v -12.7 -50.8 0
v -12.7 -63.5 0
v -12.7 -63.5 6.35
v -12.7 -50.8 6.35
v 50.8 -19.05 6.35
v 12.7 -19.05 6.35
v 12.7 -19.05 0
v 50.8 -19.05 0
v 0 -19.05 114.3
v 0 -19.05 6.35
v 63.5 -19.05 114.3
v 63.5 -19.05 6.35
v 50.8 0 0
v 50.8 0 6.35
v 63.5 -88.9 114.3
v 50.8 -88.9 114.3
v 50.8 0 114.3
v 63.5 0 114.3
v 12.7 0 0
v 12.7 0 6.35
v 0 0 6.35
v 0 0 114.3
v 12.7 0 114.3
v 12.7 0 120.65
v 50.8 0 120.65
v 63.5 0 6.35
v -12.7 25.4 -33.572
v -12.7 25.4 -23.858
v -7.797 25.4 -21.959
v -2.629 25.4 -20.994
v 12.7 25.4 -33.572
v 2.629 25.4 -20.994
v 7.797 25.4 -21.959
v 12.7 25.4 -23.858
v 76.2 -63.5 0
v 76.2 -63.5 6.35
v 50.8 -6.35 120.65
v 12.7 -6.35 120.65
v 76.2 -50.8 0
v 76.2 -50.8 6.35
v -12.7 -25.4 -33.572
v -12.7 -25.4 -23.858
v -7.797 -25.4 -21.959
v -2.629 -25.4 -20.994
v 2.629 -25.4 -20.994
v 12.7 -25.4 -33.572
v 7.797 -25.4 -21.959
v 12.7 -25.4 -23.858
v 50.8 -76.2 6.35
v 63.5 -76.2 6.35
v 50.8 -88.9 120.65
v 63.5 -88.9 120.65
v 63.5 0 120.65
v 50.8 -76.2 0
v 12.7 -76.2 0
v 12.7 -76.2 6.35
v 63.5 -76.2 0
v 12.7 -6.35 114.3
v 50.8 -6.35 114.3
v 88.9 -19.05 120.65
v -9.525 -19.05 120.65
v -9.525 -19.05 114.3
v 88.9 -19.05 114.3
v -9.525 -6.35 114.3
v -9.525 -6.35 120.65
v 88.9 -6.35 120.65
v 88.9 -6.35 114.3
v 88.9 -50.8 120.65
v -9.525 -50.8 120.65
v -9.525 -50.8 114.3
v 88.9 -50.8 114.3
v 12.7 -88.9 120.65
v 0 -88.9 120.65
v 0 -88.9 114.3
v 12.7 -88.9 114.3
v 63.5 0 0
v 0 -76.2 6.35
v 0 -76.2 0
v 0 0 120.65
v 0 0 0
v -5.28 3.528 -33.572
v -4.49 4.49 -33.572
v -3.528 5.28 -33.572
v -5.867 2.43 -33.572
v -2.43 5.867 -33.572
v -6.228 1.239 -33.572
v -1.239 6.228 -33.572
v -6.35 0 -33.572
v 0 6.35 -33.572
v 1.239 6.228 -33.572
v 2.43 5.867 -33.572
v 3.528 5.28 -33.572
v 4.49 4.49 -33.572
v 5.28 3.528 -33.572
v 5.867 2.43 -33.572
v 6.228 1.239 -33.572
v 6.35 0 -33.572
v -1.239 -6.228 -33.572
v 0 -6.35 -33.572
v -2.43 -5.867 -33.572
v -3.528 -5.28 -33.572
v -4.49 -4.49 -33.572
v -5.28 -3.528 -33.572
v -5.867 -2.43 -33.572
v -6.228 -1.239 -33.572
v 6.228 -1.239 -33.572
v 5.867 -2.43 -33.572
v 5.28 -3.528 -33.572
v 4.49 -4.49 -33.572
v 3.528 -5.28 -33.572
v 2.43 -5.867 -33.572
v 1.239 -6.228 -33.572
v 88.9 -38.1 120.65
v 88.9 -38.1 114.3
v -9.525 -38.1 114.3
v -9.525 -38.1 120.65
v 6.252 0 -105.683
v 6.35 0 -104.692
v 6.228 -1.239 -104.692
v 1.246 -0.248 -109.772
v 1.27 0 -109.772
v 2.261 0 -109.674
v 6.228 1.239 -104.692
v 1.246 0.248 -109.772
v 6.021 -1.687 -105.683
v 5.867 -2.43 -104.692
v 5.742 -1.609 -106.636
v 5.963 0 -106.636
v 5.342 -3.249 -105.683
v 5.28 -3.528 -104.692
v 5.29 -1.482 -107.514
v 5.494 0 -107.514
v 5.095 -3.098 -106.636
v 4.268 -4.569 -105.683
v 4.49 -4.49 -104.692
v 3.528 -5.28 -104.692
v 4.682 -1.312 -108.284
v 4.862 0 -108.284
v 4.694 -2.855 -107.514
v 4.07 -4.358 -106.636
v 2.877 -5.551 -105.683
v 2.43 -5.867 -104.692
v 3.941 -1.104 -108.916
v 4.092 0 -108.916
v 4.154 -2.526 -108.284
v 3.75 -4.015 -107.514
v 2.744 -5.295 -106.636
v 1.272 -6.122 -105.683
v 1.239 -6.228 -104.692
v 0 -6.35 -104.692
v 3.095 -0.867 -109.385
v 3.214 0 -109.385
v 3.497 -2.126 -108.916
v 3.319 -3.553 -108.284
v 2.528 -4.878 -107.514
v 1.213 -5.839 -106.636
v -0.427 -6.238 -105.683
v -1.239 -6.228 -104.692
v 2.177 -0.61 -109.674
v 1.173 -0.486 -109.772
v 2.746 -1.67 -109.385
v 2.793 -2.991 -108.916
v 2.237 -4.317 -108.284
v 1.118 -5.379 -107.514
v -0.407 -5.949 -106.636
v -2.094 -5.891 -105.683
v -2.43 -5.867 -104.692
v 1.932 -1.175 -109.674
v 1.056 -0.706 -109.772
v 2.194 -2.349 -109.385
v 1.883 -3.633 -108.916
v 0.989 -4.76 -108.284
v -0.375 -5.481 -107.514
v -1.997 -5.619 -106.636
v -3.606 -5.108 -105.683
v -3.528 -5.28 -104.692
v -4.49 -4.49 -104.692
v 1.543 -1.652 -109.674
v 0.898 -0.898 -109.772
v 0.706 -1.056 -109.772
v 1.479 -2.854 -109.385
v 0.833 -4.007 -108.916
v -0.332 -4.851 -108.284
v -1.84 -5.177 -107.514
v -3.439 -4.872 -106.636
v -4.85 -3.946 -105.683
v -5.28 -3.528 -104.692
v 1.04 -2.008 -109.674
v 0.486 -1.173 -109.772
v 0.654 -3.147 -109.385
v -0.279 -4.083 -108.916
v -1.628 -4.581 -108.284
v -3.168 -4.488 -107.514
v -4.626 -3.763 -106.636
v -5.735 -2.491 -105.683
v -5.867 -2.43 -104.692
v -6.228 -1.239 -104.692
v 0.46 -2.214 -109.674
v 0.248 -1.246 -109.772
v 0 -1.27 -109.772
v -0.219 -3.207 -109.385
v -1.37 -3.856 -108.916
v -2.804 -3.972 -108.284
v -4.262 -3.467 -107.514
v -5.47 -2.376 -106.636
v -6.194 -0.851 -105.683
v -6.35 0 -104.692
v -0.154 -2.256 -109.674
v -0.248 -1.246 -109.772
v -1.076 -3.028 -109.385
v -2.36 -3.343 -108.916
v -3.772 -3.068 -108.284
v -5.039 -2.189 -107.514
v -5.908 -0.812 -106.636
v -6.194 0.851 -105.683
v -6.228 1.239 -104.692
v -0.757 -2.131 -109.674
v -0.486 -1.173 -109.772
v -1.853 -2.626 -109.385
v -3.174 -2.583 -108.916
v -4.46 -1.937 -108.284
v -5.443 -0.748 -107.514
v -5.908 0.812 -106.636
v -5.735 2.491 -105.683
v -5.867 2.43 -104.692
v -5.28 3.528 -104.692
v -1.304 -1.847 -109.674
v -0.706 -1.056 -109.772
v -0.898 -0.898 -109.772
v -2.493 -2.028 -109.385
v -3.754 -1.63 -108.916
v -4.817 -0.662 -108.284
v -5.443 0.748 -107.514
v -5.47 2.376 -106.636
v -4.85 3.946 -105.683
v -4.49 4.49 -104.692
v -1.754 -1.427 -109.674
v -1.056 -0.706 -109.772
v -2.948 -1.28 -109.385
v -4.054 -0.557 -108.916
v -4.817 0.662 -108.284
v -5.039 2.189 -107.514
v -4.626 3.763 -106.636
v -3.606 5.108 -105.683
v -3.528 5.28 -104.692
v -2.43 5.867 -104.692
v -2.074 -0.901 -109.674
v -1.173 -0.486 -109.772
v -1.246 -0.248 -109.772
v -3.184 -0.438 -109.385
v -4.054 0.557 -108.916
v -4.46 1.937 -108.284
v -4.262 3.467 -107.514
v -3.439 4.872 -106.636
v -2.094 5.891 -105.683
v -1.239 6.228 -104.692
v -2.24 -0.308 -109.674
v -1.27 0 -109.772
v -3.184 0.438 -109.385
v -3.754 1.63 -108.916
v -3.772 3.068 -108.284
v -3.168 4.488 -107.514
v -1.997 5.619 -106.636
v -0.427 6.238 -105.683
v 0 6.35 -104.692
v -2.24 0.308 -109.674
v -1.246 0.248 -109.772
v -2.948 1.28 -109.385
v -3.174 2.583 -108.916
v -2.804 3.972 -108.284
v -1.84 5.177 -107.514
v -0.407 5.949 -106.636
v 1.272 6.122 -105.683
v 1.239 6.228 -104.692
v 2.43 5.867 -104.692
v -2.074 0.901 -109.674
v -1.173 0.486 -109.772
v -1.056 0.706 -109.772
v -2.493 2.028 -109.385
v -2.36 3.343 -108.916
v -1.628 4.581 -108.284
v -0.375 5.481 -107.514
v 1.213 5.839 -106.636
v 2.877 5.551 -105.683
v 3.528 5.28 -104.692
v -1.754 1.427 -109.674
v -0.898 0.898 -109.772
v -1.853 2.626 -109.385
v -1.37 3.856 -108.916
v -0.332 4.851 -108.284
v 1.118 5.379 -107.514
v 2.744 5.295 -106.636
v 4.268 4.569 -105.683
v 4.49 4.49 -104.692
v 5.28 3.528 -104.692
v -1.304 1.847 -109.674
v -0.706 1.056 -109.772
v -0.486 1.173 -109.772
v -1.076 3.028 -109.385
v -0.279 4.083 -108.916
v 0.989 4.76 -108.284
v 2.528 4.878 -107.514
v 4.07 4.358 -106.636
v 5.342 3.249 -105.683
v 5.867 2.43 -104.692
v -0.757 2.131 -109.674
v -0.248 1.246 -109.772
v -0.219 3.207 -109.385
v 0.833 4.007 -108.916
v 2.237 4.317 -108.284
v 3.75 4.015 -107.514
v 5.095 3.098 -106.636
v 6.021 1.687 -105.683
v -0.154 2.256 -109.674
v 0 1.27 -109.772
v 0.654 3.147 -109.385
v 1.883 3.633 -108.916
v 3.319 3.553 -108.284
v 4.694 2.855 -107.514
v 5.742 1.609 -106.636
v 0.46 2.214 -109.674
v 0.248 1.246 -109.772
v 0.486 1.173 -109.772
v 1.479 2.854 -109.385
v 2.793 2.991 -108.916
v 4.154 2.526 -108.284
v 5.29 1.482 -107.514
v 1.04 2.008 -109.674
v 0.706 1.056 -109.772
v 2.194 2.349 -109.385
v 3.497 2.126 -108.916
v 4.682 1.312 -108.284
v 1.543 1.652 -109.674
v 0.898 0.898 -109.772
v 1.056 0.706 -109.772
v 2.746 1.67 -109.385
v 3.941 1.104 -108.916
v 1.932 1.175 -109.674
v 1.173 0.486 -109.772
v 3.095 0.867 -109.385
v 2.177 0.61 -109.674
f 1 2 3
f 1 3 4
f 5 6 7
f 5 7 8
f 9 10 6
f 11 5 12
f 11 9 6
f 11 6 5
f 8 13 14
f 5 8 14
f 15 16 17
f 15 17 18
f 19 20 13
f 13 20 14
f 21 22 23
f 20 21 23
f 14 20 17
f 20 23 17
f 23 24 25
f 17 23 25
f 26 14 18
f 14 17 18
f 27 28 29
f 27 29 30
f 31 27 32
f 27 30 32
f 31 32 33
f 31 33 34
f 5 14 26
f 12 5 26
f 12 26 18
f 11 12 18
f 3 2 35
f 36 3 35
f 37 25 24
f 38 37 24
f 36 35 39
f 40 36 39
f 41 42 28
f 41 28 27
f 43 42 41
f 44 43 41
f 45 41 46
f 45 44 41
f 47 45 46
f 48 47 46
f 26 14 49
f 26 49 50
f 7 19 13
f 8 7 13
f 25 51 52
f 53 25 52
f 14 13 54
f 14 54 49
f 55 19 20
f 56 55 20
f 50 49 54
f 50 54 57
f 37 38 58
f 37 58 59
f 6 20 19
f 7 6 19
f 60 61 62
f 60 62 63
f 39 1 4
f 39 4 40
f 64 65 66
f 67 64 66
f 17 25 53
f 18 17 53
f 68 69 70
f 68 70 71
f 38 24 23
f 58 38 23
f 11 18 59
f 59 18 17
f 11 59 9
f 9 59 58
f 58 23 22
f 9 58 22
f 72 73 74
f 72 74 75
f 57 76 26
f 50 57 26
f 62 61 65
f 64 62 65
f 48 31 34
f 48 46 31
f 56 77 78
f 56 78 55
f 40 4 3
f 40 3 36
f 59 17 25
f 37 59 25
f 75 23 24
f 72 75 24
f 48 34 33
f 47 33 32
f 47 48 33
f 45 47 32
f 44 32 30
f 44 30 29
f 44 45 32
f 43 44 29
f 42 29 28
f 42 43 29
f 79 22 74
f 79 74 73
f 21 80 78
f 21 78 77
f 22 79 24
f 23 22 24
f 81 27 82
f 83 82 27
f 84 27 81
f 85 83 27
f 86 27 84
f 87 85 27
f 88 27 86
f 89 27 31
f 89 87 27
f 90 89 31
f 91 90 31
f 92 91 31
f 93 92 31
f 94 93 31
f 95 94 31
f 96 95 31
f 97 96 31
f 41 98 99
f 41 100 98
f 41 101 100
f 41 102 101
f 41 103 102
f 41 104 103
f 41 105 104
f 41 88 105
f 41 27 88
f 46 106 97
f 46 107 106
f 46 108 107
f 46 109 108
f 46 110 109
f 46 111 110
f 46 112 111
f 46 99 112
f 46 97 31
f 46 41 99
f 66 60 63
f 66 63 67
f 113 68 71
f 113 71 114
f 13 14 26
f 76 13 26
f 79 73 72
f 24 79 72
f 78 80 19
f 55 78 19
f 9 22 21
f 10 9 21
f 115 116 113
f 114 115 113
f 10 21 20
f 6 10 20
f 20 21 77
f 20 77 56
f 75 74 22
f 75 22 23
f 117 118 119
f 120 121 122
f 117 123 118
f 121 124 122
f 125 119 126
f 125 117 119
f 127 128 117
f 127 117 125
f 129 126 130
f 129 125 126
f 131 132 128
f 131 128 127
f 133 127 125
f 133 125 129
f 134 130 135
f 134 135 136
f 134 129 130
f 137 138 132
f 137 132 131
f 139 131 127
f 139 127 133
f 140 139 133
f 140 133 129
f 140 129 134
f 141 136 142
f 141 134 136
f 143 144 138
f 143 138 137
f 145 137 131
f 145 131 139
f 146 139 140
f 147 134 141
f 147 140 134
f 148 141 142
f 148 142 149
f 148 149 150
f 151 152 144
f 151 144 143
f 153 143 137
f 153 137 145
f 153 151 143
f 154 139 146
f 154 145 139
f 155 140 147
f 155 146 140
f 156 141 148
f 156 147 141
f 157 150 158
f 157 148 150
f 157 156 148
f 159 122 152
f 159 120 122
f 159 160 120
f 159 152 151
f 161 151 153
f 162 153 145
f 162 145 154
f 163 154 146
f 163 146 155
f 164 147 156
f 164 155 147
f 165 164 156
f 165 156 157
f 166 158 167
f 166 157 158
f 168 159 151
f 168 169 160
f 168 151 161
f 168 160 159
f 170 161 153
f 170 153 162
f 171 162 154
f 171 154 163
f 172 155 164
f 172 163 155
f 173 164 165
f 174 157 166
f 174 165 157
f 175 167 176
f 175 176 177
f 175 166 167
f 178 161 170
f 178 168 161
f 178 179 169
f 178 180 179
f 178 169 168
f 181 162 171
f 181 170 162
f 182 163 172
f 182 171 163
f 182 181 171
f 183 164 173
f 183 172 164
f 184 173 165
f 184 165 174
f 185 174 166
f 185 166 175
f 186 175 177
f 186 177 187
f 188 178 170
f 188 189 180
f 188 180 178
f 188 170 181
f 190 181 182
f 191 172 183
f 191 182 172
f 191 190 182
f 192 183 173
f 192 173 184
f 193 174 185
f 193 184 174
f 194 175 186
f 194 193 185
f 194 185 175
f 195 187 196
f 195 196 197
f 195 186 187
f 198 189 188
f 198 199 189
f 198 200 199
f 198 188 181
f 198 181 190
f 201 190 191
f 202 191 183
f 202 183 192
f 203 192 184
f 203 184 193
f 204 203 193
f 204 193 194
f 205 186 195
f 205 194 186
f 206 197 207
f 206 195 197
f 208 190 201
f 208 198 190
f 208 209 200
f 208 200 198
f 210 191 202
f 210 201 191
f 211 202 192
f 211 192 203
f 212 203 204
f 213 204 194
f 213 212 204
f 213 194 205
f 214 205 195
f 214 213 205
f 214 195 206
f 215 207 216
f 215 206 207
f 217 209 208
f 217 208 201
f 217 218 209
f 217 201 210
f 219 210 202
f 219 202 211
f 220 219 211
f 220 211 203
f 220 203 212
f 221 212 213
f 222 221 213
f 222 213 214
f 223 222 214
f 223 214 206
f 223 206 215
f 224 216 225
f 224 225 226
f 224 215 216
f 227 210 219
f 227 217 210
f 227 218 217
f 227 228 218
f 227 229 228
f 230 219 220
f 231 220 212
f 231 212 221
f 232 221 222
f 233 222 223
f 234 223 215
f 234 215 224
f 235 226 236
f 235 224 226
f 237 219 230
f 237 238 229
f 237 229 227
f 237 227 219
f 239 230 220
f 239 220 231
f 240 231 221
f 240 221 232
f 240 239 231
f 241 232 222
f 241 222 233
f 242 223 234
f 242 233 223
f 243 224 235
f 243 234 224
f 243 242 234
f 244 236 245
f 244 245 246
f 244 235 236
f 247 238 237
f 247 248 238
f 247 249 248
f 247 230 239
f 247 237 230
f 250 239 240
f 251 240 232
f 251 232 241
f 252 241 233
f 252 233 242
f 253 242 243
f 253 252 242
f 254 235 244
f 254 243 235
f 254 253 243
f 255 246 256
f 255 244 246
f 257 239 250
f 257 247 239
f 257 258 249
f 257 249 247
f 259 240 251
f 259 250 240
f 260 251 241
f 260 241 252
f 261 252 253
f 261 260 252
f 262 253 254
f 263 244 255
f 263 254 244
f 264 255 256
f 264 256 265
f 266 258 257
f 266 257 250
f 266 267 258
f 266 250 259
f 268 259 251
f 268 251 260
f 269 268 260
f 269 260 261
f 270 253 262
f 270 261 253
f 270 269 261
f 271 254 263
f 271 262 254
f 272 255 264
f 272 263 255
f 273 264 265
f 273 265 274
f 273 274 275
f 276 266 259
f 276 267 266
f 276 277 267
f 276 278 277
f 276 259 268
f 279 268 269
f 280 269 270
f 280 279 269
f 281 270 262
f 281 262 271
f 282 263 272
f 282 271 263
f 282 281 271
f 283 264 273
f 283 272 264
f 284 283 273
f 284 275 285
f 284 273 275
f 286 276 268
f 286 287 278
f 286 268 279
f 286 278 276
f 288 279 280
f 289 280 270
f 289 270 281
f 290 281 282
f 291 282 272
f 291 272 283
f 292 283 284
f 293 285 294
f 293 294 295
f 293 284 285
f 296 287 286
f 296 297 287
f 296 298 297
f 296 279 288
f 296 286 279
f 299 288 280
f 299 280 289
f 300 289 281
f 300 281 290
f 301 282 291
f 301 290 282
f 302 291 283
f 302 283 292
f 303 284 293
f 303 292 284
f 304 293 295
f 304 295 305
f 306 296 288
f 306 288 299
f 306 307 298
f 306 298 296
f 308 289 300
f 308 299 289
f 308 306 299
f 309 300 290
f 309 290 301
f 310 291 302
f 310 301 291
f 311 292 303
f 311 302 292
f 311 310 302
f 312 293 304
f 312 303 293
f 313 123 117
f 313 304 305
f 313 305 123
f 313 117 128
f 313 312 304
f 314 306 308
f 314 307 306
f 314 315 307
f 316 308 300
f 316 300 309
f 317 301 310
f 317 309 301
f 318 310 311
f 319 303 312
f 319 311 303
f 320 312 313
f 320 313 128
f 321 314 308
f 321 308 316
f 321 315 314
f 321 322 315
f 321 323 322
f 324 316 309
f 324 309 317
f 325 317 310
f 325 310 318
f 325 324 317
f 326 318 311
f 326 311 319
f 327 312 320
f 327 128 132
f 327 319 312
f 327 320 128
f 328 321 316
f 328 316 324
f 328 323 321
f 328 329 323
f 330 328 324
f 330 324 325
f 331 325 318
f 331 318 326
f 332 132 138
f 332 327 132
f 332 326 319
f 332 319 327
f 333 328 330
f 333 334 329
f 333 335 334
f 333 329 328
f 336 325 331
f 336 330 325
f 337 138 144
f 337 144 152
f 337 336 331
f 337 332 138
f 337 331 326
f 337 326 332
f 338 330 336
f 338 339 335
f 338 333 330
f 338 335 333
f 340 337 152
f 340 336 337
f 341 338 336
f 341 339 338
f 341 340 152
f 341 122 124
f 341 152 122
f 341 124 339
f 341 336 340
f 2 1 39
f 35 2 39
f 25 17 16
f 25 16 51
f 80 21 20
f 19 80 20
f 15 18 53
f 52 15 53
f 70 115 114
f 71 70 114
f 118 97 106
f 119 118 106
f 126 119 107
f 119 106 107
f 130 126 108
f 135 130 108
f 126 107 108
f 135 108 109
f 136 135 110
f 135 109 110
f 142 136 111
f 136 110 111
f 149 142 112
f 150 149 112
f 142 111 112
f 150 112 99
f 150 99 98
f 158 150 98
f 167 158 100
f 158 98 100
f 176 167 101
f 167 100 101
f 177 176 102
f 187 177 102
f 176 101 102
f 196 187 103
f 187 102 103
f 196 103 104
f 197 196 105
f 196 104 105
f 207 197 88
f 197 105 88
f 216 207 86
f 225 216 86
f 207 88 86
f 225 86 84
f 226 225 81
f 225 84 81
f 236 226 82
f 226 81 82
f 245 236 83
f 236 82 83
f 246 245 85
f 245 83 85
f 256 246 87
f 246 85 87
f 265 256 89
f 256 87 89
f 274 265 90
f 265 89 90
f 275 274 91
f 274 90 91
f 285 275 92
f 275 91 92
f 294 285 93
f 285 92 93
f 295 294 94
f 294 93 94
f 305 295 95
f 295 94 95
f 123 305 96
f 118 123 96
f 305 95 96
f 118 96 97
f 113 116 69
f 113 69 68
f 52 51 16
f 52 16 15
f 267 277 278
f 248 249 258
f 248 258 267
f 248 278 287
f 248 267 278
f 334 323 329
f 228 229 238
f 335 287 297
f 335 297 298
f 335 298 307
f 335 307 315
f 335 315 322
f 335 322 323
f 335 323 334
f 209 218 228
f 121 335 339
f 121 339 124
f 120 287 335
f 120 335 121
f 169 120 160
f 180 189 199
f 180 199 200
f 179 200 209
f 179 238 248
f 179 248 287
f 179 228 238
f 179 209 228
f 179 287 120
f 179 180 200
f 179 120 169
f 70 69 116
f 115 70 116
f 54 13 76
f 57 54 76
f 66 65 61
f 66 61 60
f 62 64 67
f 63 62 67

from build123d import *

# Parameters (mm, degrees)
F1_DEPTH  = 19.05
F2_W      = 12.7
F2_H      = 6.35
F3_DEPTH  = 76.2
F4_W      = 12.7
F4_H      = 6.35
F5_DEPTH  = 88.9
F7_DEPTH  = 25.4
F8_R      = 6.35
F9_DEPTH  = 76.2
F10_R     = 5.08
F11_W     = 98.425
F11_H     = 12.7
F12_DEPTH = 6.35
F13_W     = 88.9
F13_H     = 12.7
F14_DEPTH = 6.35


with BuildPart() as f1:
    # F0 (on Front) → F1 (new body)
    with BuildSketch(Plane.XZ):
        Polygon((12.7, 6.35), (12.7, 0), (50.8, 0), (50.8, 6.35), (63.5, 6.35), (63.5, 114.3), (50.8, 114.3), (50.8, 120.65), (12.7, 120.65), (12.7, 114.3), (0, 114.3), (0, 6.35), align=None)
    extrude(amount=F1_DEPTH)


with BuildPart() as f3:
    # F2 (on Front) → F3 (new body)
    with BuildSketch(Plane.XZ):
        with Locations((6.35, 3.175)):
            Rectangle(F2_W, F2_H)
        with Locations((57.15, 3.175)):
            Rectangle(F2_W, F2_H)
    extrude(amount=F3_DEPTH)


with BuildPart() as f5:
    # F4 (on Front) → F5 (new body)
    with BuildSketch(Plane.XZ):
        with Locations((6.35, 117.475)):
            Rectangle(F4_W, F4_H)
        with Locations((57.15, 117.475)):
            Rectangle(F4_W, F4_H)
    extrude(amount=F5_DEPTH)


with BuildPart() as f7:
    # F6 (on Front) → F7 (new body, symmetric)
    with BuildSketch(Plane.XZ):
        with BuildLine():
            Line((12.7, -33.572016), (12.7, -23.858269))
            ThreePointArc((12.7, -23.858269), (0, -20.872016), (-12.7, -23.858269))
            Line((-12.7, -23.858269), (-12.7, -33.572016))
            Line((-12.7, -33.572016), (12.7, -33.572016))
        make_face()
    extrude(amount=F7_DEPTH, both=True)

    # F8 (on face) → F9 (join)
    with BuildSketch(Plane(origin=(0, 0, -33.572016), x_dir=(1, 0, 0), z_dir=(0, 0, -1))):
        Circle(F8_R)
    extrude(amount=F9_DEPTH)

    # F10
    f10_edges = [f7.edges().sort_by_distance(p)[0] for p in [
        (-6.35, 0, -109.772016),
    ]]
    fillet(f10_edges, radius=F10_R)


with BuildPart() as f12:
    # F11 (on face) → F12 (new body, through all)
    with BuildSketch(Plane.XY.offset(120.65)):
        with Locations((39.6875, -12.7)):
            Rectangle(F11_W, F11_H)
        with Locations((39.6875, -44.45)):
            Rectangle(F11_W, F11_H)
    extrude(amount=-F12_DEPTH)


with BuildPart() as f14:
    # F13 (on Top) → F14 (new body, through all)
    with BuildSketch(Plane.XY):
        with Locations((31.75, -57.15)):
            Rectangle(F13_W, F13_H)
    extrude(amount=F14_DEPTH)


with BuildPart() as f1_1:
    add(f1.part)

    # F15: cut F12
    add(f12.part, mode=Mode.SUBTRACT)


solid = Compound([f3.part, f5.part, f7.part, f12.part, f14.part, f1_1.part])
